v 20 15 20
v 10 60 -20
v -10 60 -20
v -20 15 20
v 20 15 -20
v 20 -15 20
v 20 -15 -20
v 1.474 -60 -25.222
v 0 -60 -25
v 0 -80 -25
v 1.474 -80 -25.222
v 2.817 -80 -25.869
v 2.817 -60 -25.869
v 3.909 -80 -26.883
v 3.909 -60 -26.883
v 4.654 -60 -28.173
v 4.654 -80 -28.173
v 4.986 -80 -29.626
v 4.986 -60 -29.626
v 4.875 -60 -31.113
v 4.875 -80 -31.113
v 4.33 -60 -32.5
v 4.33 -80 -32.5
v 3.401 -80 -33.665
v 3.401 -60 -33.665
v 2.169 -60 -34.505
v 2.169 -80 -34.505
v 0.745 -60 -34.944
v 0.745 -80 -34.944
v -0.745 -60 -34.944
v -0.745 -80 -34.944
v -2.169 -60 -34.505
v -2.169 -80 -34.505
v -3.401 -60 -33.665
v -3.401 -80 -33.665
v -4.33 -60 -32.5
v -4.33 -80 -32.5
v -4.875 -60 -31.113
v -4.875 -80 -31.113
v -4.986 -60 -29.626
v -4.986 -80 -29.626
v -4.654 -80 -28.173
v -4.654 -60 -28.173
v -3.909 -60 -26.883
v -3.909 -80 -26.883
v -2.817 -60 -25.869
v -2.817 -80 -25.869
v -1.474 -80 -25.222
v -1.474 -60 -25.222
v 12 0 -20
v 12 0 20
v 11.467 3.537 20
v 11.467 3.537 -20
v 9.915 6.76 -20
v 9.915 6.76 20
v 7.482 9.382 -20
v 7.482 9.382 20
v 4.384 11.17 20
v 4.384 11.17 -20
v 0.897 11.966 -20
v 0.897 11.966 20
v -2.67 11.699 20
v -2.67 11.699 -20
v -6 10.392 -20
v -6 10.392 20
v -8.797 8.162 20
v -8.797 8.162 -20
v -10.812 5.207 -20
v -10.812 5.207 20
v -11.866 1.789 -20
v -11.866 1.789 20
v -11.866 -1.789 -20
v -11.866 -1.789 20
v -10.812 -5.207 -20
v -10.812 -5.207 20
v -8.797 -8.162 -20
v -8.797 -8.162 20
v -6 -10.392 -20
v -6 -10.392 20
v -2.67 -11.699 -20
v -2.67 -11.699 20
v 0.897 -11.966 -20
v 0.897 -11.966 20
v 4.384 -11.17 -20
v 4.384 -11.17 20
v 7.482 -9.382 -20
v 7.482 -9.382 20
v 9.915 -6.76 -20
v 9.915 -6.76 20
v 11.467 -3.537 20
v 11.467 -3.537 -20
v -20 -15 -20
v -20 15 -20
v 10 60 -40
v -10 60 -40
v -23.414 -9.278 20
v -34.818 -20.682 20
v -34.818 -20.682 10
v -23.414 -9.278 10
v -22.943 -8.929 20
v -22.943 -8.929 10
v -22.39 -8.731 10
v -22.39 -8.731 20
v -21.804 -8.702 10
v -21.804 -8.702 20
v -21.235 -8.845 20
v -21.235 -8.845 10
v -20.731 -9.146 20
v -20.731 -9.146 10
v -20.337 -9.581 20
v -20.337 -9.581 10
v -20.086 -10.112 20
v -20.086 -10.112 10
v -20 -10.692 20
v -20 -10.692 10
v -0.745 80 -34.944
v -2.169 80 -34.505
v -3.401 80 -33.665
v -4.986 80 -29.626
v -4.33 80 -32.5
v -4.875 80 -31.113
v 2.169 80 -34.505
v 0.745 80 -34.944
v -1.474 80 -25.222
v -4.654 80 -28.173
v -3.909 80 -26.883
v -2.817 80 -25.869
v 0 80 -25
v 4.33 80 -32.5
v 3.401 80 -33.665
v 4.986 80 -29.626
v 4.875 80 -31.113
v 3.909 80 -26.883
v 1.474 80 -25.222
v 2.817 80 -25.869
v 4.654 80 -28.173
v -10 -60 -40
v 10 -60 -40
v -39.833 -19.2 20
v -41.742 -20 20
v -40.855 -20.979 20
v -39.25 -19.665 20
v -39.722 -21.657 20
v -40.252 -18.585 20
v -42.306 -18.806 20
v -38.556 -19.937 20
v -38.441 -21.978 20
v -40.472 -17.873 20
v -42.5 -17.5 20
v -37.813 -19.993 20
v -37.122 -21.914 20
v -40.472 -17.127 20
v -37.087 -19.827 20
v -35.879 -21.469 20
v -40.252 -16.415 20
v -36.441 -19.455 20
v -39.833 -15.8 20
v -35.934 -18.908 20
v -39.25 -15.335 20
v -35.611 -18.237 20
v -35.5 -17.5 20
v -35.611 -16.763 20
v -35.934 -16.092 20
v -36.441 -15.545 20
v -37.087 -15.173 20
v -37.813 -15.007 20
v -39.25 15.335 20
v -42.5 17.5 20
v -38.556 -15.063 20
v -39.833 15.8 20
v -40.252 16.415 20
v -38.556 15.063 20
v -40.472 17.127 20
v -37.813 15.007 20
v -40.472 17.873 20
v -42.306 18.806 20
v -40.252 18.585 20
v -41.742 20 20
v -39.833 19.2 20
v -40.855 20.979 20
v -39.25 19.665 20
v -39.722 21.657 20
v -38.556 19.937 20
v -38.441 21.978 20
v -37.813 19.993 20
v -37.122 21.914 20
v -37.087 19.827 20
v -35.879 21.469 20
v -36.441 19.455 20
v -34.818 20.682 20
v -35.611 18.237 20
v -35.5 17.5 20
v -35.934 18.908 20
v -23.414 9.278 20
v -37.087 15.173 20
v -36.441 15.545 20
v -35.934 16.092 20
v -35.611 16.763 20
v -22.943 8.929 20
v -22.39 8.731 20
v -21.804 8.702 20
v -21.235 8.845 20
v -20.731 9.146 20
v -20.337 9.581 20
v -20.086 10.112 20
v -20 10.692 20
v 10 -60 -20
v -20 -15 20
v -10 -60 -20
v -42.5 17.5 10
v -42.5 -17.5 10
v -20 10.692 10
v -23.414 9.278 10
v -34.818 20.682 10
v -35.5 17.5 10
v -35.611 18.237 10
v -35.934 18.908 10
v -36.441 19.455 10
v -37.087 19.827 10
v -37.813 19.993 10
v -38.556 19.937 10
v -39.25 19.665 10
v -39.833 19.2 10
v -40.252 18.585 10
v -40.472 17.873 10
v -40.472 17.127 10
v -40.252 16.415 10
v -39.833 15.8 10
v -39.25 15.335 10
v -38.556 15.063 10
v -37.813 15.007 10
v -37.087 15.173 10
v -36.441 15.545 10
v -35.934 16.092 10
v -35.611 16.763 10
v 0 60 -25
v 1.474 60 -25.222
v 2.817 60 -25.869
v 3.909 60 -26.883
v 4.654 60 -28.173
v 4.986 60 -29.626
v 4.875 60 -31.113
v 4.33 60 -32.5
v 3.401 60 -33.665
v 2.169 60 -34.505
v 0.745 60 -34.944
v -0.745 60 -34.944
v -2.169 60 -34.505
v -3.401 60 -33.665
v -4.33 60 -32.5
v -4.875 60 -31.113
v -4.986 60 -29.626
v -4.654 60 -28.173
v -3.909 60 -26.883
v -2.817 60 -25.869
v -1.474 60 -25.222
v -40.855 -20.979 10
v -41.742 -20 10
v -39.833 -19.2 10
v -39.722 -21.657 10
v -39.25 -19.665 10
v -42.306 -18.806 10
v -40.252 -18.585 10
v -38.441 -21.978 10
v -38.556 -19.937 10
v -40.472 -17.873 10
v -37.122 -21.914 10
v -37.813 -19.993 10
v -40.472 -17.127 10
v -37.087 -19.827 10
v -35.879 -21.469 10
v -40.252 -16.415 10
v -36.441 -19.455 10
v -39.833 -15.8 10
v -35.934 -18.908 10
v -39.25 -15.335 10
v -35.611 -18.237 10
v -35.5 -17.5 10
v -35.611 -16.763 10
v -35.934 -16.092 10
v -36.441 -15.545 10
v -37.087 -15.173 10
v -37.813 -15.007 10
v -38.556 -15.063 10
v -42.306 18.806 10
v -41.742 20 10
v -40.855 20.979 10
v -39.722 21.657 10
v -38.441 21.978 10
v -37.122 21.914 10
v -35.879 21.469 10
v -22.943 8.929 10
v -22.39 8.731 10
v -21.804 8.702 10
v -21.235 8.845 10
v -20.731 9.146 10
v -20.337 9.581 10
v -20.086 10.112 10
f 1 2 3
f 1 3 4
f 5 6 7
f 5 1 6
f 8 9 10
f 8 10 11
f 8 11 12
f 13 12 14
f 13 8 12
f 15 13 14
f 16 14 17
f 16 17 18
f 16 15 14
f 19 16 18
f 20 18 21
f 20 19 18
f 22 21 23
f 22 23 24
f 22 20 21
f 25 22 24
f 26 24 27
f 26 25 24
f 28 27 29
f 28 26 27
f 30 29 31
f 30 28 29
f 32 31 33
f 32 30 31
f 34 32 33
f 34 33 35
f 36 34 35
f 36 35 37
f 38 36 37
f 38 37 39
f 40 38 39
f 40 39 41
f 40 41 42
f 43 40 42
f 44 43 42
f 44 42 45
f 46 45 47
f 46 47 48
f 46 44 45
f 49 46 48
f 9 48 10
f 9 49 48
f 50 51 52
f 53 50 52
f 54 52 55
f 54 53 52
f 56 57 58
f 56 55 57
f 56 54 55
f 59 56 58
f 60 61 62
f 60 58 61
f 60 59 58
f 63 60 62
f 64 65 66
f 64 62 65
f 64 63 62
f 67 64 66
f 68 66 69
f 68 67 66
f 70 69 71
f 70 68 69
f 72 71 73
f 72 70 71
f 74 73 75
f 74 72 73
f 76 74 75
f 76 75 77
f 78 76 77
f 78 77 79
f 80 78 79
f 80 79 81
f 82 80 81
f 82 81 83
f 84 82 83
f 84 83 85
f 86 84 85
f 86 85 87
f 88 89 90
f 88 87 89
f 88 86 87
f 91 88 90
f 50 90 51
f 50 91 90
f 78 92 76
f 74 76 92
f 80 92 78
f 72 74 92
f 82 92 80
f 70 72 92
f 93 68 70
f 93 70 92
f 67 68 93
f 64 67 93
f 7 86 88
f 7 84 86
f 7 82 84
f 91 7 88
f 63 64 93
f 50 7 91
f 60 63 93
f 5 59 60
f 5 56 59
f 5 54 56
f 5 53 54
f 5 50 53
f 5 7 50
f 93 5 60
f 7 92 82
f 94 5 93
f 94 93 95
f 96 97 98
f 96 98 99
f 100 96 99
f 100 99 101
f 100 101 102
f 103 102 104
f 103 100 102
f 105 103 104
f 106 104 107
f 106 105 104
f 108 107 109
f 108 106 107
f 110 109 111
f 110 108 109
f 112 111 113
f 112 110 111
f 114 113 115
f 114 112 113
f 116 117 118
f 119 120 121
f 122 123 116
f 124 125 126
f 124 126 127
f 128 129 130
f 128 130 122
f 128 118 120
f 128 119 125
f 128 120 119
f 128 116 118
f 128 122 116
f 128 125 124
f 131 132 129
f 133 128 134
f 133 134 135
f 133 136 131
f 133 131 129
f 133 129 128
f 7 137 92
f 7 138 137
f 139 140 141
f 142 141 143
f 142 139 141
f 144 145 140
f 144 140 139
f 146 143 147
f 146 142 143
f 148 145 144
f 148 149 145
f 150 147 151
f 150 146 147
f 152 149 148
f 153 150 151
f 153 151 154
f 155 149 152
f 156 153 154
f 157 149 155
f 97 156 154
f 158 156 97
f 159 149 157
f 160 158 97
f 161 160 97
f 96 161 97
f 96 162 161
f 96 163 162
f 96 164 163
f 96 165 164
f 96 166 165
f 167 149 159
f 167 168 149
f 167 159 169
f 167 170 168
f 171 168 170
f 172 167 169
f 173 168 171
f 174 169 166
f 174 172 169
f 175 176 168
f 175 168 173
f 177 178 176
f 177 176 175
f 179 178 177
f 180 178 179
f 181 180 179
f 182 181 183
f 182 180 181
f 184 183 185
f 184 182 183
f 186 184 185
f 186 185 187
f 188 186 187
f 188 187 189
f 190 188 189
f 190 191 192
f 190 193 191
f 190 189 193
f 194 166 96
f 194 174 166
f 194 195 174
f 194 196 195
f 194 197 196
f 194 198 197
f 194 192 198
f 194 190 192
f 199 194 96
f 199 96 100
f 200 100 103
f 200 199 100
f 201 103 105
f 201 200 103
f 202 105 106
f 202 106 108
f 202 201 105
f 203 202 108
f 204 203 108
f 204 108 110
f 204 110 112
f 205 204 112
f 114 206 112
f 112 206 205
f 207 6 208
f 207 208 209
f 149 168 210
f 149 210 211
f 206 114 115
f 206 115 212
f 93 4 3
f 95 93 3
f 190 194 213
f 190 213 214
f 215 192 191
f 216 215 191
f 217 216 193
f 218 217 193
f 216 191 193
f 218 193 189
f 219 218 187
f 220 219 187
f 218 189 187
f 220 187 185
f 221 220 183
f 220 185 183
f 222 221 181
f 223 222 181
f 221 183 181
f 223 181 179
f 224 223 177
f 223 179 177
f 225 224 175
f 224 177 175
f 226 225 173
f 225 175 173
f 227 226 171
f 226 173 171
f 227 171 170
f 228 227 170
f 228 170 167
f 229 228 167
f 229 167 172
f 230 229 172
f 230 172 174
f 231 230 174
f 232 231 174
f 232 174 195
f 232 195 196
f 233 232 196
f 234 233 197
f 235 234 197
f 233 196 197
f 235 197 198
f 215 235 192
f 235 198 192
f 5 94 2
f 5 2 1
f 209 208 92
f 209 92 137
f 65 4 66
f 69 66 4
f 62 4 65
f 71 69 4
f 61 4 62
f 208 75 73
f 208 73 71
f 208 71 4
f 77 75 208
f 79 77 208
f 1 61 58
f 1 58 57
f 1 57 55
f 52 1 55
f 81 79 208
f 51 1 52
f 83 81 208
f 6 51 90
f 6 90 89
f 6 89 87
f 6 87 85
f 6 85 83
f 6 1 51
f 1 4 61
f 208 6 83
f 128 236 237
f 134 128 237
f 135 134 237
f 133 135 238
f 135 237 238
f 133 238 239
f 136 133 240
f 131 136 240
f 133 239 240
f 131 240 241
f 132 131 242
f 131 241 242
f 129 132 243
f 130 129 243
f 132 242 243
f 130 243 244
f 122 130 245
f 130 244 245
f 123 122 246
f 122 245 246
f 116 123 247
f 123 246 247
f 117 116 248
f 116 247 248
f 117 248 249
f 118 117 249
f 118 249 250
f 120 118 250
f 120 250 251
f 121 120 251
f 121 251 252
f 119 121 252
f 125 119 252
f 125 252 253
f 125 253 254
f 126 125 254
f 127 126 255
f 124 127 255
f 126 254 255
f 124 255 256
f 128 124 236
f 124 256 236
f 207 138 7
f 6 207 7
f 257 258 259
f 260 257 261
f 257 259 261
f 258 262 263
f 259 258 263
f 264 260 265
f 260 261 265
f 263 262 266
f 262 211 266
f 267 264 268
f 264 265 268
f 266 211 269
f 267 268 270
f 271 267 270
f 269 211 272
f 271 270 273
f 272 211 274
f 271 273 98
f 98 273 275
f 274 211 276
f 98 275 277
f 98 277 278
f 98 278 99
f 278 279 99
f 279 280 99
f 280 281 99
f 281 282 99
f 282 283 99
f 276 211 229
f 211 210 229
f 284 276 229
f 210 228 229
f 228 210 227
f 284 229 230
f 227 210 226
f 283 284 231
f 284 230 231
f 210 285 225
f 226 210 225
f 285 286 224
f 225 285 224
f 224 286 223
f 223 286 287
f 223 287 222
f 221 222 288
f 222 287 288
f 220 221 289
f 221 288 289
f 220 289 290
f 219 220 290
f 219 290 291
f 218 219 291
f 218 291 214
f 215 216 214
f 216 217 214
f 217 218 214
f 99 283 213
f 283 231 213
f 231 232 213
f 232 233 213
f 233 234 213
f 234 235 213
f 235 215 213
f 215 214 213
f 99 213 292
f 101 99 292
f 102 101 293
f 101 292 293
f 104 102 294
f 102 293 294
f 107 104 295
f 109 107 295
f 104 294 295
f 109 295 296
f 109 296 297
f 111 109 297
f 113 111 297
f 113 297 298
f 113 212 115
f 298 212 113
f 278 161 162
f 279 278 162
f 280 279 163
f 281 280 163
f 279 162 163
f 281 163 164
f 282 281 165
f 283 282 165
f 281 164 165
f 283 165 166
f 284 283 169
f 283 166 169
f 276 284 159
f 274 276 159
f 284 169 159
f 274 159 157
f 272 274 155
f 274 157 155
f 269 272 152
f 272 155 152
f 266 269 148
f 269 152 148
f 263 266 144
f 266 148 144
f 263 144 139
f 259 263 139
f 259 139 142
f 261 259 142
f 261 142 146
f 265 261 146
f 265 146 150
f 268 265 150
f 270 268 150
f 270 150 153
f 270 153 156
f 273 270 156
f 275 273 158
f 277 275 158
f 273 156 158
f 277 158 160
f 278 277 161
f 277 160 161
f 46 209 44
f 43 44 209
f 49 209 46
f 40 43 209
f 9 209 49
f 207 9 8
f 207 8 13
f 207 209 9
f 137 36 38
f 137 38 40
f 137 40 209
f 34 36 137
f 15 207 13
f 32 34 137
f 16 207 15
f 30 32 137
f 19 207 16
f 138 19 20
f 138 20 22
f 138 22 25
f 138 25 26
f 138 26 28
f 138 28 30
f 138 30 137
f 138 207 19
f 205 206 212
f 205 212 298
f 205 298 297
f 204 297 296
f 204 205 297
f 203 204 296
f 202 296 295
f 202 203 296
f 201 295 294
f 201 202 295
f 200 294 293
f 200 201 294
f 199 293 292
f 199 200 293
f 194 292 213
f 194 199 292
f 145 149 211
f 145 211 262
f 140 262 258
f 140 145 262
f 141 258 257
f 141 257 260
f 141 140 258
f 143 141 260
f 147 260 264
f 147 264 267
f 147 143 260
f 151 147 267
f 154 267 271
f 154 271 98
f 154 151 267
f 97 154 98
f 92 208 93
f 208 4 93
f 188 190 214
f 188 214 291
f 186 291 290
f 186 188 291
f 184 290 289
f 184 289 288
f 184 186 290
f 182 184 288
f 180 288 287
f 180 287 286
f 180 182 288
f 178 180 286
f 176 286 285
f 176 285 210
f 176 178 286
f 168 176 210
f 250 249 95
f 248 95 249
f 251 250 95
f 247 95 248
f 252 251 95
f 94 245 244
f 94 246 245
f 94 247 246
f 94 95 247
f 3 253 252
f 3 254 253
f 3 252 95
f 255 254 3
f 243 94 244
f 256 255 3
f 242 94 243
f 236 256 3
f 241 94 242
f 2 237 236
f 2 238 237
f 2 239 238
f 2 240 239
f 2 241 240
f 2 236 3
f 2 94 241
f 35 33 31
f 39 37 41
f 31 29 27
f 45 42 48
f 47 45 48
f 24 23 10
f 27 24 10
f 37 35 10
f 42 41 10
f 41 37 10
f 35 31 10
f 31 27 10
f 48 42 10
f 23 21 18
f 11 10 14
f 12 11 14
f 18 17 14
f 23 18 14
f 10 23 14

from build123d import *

# Parameters (mm, degrees)
BOSS_EXTRUDE1_DEPTH     = 20
CUT_EXTRUDE1_DEPTH      = 88.177978871
CUT_EXTRUDE1_DEPTH_BACK = 88.177978871
SKETCH2_R               = 12
SKETCH3_R               = 2.5
BOSS_EXTRUDE2_DEPTH     = 10
SKETCH5_R               = 5
BOSS_EXTRUDE3_DEPTH     = 20
CUT_EXTRUDE2_DEPTH      = 109.656569061


with BuildPart() as part:
    # Sketch1 → Boss-Extrude1 (new, symmetric)
    with BuildSketch(Plane(origin=(0, 0, 0), x_dir=(0, 0, -1), z_dir=(1, 0, 0))):
        Polygon((-20, 0), (20, 0), (20, 15), (40, 60), (20, 60), (-20, 15), align=None)
        Polygon((20, -15), (20, 0), (-20, 0), (-20, -15), (20, -60), (40, -60), align=None)
    extrude(amount=BOSS_EXTRUDE1_DEPTH, both=True)

    # Sketch2 → Cut-Extrude1 (cut, two sides: drawn at the far end of the back side and taken through both)
    with BuildSketch(Plane.XY.offset(20).offset(-CUT_EXTRUDE1_DEPTH_BACK)):
        Circle(SKETCH2_R)
    extrude(amount=CUT_EXTRUDE1_DEPTH + CUT_EXTRUDE1_DEPTH_BACK, mode=Mode.SUBTRACT)

    # Sketch5 → Boss-Extrude3 (add)
    with BuildSketch(Plane(origin=(0, 60, 0), x_dir=(1, 0, 0), z_dir=(0, 1, 0))):
        with Locations(Location((0, 30, 0), (0, 0, 270))):
            Circle(SKETCH5_R)
    boss_extrude3 = extrude(amount=BOSS_EXTRUDE3_DEPTH)

    # Mirror1: Boss-Extrude3 across plane
    add(boss_extrude3.mirror(Plane.ZX))

    # Sketch6 → Cut-Extrude2 (cut, symmetric)
    with BuildSketch(Plane.XY.offset(20)):
        Polygon((20, 15), (20, 60), (10, 60), align=None)
        Polygon((-20, 60), (-20, 15), (-10, 60), align=None)
    cut_extrude2 = extrude(amount=CUT_EXTRUDE2_DEPTH, both=True, mode=Mode.SUBTRACT)

    # Mirror2: Cut-Extrude2 across plane
    add(cut_extrude2.mirror(Plane.ZX), mode=Mode.SUBTRACT)


with BuildPart() as body_2:
    # Sketch3 → Boss-Extrude2 (new body)
    with BuildSketch(Plane.XY.offset(20)):
        with BuildLine():
            ThreePointArc((-20, 10.692388155), (-21.234633135, 8.84462909), (-23.414213562, 9.278174593))
            Line((-23.414213562, 9.278174593), (-34.818019485, 20.681980515))
            ThreePointArc((-34.818019485, 20.681980515), (-39.722075446, 21.657457896), (-42.5, 17.5))
            Line((-42.5, 17.5), (-42.5, -17.5))
            ThreePointArc((-42.5, -17.5), (-39.722075446, -21.657457896), (-34.818019485, -20.681980515))
            Line((-34.818019485, -20.681980515), (-23.414213562, -9.278174593))
            ThreePointArc((-23.414213562, -9.278174593), (-21.234633135, -8.84462909), (-20, -10.692388155))
            Line((-20, -10.692388155), (-20, 10.692388155))
        make_face()
        with Locations((-38, -17.5)):
            Circle(SKETCH3_R, mode=Mode.SUBTRACT)
        with Locations((-38, 17.5)):
            Circle(SKETCH3_R, mode=Mode.SUBTRACT)
    extrude(amount=-BOSS_EXTRUDE2_DEPTH)


solid = Compound([part.part, body_2.part])
